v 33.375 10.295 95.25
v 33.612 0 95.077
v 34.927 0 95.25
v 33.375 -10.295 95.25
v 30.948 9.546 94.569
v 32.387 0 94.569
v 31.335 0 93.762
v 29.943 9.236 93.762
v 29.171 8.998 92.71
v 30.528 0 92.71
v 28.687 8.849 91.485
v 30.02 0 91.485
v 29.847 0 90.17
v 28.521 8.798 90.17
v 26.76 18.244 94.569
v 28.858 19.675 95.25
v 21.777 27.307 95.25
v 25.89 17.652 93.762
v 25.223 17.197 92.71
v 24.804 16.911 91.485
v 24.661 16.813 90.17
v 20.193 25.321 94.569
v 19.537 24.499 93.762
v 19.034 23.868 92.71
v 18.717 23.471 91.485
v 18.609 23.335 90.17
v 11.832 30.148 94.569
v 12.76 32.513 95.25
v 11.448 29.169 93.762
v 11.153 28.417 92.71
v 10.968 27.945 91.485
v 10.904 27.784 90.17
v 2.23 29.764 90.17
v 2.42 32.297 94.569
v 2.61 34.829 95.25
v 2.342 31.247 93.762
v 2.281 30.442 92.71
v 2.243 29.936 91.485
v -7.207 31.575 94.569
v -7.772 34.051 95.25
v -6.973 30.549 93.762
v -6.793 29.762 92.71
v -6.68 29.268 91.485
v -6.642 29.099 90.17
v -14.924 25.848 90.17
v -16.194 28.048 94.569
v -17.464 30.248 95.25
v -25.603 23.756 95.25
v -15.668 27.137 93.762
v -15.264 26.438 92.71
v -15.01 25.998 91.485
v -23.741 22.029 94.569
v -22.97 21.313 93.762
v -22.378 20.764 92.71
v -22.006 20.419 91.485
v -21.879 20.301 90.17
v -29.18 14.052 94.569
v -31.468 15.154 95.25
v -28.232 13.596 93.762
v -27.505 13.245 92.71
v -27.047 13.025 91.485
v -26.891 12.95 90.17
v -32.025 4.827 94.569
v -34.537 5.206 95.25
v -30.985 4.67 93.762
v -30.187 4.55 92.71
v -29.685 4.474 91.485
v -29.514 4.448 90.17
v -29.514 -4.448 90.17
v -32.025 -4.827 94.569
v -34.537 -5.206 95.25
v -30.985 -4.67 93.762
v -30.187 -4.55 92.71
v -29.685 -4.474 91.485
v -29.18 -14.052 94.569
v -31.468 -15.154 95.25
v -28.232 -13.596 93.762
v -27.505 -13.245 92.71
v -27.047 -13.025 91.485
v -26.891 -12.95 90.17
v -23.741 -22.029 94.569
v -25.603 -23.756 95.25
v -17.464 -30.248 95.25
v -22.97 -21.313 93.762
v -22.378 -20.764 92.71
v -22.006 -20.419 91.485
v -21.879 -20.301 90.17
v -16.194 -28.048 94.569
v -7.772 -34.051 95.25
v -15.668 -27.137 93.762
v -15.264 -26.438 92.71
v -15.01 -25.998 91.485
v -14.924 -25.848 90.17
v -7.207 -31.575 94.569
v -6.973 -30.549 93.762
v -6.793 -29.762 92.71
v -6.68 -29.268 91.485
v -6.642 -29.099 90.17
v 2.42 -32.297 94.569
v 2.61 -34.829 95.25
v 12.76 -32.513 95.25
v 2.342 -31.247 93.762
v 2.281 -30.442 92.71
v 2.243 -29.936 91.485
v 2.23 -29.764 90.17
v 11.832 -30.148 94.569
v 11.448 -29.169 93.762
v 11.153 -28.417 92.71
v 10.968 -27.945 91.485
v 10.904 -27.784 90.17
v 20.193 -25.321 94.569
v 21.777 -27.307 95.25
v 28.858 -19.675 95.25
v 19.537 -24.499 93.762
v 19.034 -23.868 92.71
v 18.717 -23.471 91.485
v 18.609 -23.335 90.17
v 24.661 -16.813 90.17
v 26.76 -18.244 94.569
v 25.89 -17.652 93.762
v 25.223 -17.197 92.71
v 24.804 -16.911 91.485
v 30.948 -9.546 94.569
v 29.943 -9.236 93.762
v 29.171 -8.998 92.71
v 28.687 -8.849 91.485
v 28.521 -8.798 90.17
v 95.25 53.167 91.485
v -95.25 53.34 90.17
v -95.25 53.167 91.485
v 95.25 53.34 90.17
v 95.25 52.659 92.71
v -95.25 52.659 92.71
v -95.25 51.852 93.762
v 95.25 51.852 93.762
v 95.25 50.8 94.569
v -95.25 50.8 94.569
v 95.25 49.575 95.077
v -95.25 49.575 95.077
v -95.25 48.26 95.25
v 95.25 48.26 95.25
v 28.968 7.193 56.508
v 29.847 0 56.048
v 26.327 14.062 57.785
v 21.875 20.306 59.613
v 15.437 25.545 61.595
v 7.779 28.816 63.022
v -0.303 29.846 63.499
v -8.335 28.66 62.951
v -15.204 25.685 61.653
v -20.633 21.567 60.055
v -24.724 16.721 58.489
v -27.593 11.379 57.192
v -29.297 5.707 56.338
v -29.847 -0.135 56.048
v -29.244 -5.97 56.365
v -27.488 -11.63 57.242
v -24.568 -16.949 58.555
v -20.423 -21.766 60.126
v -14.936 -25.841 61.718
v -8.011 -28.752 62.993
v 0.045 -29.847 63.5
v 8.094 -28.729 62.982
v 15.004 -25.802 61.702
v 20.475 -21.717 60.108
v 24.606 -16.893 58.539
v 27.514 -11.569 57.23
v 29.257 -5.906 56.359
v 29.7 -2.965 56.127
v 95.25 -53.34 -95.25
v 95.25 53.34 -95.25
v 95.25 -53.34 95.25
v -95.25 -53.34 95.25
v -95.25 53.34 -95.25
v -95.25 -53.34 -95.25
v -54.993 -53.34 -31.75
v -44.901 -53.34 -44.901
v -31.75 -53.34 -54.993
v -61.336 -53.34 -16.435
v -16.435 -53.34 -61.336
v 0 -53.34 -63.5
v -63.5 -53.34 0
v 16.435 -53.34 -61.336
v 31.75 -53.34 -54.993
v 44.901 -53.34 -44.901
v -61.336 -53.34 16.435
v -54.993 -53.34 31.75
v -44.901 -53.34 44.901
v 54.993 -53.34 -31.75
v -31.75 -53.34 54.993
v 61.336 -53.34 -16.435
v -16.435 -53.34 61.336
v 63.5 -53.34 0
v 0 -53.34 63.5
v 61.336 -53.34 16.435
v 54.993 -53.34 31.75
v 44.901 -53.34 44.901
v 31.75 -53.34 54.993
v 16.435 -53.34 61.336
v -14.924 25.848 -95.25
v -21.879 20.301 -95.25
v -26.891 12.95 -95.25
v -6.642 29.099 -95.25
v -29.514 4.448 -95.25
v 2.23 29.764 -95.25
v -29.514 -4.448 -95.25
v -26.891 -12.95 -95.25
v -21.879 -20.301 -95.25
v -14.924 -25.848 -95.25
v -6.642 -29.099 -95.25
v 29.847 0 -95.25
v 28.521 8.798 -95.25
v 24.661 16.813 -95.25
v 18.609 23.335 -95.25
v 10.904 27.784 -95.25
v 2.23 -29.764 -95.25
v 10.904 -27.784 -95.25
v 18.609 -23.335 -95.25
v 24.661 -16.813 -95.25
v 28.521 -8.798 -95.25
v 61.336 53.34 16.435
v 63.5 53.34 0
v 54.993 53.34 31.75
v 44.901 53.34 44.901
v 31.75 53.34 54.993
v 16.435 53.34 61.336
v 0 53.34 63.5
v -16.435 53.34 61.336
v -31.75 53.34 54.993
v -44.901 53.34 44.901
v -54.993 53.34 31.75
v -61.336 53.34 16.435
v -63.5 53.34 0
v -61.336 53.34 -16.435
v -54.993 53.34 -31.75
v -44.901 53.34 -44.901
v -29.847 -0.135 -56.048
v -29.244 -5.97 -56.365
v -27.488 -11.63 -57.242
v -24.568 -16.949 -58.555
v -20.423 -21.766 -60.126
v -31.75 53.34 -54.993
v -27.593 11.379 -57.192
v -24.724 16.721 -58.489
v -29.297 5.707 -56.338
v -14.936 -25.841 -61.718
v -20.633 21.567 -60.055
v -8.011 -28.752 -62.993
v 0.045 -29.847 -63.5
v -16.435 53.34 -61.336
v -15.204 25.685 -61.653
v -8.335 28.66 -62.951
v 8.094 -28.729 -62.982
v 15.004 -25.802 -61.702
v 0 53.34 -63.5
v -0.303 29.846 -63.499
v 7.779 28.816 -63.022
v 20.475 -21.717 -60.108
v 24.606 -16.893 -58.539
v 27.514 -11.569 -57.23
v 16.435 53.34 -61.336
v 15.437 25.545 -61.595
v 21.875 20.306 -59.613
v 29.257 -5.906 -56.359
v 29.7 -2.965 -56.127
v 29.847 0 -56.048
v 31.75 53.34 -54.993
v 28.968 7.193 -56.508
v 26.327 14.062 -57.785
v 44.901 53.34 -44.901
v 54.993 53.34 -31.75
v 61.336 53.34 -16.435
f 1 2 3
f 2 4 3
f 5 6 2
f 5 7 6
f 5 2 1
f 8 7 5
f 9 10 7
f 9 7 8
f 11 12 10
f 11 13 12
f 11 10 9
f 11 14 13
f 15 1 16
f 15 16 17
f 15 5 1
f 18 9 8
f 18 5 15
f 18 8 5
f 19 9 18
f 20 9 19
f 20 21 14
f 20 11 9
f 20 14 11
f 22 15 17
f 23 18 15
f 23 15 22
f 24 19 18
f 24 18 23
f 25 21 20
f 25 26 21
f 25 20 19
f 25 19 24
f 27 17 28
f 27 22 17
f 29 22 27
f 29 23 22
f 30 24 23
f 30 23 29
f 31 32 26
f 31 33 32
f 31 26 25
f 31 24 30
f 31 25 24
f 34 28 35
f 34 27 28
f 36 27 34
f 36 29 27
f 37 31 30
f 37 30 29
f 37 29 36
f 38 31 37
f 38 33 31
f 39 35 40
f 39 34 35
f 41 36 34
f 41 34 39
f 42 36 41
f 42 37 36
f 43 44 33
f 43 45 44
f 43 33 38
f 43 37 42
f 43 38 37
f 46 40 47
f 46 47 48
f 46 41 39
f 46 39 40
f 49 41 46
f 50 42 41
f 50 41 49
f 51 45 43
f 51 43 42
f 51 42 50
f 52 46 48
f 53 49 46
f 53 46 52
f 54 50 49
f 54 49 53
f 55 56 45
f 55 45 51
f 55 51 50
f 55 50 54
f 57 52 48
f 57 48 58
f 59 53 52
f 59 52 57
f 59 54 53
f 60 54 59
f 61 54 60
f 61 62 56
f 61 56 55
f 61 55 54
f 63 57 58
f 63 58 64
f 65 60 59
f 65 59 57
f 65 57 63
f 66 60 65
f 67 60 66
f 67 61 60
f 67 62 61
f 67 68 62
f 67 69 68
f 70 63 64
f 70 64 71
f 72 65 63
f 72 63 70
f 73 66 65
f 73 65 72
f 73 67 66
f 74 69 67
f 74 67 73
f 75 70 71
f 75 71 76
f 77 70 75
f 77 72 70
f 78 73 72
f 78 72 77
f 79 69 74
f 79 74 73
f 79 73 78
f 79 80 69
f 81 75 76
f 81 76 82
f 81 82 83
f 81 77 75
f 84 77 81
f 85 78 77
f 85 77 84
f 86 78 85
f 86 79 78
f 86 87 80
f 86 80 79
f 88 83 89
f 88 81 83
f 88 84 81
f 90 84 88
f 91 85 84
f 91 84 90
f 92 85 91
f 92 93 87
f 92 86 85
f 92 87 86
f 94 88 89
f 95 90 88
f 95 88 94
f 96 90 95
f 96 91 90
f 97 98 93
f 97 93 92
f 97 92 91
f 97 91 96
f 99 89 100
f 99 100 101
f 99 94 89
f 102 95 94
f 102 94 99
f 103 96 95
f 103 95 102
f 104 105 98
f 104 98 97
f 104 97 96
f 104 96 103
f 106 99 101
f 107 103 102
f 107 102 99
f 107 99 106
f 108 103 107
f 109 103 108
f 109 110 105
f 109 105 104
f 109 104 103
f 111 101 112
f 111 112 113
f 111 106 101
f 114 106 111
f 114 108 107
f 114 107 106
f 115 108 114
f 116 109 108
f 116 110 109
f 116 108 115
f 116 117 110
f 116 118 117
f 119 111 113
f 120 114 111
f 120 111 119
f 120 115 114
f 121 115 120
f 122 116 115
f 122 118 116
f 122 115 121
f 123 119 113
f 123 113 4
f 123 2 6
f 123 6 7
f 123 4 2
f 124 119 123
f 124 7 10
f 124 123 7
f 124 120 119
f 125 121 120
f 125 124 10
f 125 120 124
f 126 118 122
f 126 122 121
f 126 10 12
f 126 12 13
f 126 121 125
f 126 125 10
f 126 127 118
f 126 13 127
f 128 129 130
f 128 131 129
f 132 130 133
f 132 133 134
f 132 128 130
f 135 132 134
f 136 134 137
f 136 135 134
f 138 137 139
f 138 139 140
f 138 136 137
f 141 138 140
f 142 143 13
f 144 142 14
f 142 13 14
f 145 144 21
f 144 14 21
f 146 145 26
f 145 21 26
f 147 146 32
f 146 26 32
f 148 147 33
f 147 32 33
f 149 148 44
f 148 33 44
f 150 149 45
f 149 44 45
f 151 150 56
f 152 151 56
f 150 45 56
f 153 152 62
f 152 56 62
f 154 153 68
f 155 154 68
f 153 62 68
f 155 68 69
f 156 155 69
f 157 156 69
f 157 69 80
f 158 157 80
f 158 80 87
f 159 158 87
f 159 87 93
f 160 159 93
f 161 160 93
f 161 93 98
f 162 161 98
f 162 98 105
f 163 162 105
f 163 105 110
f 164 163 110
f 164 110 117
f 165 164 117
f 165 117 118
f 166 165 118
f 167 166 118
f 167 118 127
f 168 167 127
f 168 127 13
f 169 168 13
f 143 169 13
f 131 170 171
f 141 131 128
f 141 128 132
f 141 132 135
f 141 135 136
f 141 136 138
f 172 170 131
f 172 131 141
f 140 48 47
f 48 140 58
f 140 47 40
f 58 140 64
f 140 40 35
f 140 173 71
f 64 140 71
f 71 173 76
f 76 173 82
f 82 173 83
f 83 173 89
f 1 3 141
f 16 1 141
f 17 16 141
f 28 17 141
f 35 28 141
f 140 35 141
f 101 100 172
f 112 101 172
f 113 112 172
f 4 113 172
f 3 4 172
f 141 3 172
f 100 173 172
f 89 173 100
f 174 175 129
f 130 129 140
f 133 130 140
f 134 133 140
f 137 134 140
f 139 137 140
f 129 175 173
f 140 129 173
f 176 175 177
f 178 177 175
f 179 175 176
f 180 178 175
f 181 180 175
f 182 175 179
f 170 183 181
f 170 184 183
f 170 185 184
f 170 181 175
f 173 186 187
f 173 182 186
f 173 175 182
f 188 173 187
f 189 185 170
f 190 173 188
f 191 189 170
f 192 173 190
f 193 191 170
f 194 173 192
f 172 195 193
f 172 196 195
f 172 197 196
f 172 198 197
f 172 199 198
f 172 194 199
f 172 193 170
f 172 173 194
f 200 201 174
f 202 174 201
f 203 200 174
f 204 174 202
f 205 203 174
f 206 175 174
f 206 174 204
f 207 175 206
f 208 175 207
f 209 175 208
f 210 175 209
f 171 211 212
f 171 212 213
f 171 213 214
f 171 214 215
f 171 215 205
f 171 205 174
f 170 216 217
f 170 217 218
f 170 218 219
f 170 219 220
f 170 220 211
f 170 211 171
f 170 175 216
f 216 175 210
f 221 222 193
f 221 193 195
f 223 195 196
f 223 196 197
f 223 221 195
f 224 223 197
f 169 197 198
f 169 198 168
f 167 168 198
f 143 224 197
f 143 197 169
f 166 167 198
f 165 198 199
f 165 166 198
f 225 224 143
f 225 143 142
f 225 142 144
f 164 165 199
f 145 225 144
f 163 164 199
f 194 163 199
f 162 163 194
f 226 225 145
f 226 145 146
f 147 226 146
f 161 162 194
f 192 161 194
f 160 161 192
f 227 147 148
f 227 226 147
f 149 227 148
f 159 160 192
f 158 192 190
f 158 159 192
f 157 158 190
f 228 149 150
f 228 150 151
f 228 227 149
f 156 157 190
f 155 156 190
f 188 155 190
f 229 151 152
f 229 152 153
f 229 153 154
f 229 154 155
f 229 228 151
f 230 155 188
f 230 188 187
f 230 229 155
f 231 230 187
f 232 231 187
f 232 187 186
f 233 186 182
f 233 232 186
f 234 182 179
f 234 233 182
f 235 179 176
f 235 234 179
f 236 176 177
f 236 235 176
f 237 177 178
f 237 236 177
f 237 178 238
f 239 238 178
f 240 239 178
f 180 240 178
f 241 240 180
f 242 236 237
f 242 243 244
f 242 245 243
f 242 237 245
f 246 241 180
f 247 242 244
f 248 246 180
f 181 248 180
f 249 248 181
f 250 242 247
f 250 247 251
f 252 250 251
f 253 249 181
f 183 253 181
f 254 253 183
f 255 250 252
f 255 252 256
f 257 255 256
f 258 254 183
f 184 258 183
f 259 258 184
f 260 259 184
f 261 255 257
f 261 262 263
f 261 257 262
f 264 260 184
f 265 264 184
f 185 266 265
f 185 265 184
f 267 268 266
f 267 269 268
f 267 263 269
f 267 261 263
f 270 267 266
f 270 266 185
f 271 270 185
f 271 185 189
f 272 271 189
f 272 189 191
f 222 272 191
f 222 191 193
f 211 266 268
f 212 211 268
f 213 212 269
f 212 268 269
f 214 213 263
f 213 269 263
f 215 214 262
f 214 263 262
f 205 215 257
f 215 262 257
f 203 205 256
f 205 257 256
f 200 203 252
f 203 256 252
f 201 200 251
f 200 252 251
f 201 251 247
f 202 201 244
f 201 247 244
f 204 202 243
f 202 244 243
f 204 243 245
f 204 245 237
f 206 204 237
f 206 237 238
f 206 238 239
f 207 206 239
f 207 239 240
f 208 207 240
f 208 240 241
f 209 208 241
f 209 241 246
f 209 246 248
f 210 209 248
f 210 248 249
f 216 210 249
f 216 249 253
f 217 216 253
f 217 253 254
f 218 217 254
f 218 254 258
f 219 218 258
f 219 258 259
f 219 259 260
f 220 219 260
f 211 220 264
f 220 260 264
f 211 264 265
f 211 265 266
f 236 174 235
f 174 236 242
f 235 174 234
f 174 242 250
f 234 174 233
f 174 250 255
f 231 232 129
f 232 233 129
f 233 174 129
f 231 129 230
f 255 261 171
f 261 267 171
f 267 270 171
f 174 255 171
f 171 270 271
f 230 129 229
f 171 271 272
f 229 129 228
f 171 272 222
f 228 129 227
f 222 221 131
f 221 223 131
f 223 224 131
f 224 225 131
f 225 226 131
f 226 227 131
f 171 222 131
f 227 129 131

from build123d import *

# Parameters (mm, degrees)
F0_W     = 190.5
F0_H     = 190.5
F0_R     = 63.5
F1_DEPTH = 53.34
F2_R     = 29.847135
F3_DEPTH = 190.501
F4_R     = 5.08


with BuildPart() as f1:
    # F0 (on Front) → F1 (new body, symmetric)
    with BuildSketch(Plane.XZ):
        Rectangle(F0_W, F0_H)
        Circle(F0_R, mode=Mode.SUBTRACT)
    extrude(amount=F1_DEPTH, both=True)

    # F2 (on face) → F3 (cut, through all)
    with BuildSketch(Plane.XY.offset(95.25)):
        Circle(F2_R)
    extrude(amount=-F3_DEPTH, mode=Mode.SUBTRACT)

    # F4
    f4_edges = [f1.edges().sort_by_distance(p)[0] for p in [
        (-29.847135, 0, 95.25),
        (0, 53.34, 95.25),
    ]]
    fillet(f4_edges, radius=F4_R)


solid = f1.part
